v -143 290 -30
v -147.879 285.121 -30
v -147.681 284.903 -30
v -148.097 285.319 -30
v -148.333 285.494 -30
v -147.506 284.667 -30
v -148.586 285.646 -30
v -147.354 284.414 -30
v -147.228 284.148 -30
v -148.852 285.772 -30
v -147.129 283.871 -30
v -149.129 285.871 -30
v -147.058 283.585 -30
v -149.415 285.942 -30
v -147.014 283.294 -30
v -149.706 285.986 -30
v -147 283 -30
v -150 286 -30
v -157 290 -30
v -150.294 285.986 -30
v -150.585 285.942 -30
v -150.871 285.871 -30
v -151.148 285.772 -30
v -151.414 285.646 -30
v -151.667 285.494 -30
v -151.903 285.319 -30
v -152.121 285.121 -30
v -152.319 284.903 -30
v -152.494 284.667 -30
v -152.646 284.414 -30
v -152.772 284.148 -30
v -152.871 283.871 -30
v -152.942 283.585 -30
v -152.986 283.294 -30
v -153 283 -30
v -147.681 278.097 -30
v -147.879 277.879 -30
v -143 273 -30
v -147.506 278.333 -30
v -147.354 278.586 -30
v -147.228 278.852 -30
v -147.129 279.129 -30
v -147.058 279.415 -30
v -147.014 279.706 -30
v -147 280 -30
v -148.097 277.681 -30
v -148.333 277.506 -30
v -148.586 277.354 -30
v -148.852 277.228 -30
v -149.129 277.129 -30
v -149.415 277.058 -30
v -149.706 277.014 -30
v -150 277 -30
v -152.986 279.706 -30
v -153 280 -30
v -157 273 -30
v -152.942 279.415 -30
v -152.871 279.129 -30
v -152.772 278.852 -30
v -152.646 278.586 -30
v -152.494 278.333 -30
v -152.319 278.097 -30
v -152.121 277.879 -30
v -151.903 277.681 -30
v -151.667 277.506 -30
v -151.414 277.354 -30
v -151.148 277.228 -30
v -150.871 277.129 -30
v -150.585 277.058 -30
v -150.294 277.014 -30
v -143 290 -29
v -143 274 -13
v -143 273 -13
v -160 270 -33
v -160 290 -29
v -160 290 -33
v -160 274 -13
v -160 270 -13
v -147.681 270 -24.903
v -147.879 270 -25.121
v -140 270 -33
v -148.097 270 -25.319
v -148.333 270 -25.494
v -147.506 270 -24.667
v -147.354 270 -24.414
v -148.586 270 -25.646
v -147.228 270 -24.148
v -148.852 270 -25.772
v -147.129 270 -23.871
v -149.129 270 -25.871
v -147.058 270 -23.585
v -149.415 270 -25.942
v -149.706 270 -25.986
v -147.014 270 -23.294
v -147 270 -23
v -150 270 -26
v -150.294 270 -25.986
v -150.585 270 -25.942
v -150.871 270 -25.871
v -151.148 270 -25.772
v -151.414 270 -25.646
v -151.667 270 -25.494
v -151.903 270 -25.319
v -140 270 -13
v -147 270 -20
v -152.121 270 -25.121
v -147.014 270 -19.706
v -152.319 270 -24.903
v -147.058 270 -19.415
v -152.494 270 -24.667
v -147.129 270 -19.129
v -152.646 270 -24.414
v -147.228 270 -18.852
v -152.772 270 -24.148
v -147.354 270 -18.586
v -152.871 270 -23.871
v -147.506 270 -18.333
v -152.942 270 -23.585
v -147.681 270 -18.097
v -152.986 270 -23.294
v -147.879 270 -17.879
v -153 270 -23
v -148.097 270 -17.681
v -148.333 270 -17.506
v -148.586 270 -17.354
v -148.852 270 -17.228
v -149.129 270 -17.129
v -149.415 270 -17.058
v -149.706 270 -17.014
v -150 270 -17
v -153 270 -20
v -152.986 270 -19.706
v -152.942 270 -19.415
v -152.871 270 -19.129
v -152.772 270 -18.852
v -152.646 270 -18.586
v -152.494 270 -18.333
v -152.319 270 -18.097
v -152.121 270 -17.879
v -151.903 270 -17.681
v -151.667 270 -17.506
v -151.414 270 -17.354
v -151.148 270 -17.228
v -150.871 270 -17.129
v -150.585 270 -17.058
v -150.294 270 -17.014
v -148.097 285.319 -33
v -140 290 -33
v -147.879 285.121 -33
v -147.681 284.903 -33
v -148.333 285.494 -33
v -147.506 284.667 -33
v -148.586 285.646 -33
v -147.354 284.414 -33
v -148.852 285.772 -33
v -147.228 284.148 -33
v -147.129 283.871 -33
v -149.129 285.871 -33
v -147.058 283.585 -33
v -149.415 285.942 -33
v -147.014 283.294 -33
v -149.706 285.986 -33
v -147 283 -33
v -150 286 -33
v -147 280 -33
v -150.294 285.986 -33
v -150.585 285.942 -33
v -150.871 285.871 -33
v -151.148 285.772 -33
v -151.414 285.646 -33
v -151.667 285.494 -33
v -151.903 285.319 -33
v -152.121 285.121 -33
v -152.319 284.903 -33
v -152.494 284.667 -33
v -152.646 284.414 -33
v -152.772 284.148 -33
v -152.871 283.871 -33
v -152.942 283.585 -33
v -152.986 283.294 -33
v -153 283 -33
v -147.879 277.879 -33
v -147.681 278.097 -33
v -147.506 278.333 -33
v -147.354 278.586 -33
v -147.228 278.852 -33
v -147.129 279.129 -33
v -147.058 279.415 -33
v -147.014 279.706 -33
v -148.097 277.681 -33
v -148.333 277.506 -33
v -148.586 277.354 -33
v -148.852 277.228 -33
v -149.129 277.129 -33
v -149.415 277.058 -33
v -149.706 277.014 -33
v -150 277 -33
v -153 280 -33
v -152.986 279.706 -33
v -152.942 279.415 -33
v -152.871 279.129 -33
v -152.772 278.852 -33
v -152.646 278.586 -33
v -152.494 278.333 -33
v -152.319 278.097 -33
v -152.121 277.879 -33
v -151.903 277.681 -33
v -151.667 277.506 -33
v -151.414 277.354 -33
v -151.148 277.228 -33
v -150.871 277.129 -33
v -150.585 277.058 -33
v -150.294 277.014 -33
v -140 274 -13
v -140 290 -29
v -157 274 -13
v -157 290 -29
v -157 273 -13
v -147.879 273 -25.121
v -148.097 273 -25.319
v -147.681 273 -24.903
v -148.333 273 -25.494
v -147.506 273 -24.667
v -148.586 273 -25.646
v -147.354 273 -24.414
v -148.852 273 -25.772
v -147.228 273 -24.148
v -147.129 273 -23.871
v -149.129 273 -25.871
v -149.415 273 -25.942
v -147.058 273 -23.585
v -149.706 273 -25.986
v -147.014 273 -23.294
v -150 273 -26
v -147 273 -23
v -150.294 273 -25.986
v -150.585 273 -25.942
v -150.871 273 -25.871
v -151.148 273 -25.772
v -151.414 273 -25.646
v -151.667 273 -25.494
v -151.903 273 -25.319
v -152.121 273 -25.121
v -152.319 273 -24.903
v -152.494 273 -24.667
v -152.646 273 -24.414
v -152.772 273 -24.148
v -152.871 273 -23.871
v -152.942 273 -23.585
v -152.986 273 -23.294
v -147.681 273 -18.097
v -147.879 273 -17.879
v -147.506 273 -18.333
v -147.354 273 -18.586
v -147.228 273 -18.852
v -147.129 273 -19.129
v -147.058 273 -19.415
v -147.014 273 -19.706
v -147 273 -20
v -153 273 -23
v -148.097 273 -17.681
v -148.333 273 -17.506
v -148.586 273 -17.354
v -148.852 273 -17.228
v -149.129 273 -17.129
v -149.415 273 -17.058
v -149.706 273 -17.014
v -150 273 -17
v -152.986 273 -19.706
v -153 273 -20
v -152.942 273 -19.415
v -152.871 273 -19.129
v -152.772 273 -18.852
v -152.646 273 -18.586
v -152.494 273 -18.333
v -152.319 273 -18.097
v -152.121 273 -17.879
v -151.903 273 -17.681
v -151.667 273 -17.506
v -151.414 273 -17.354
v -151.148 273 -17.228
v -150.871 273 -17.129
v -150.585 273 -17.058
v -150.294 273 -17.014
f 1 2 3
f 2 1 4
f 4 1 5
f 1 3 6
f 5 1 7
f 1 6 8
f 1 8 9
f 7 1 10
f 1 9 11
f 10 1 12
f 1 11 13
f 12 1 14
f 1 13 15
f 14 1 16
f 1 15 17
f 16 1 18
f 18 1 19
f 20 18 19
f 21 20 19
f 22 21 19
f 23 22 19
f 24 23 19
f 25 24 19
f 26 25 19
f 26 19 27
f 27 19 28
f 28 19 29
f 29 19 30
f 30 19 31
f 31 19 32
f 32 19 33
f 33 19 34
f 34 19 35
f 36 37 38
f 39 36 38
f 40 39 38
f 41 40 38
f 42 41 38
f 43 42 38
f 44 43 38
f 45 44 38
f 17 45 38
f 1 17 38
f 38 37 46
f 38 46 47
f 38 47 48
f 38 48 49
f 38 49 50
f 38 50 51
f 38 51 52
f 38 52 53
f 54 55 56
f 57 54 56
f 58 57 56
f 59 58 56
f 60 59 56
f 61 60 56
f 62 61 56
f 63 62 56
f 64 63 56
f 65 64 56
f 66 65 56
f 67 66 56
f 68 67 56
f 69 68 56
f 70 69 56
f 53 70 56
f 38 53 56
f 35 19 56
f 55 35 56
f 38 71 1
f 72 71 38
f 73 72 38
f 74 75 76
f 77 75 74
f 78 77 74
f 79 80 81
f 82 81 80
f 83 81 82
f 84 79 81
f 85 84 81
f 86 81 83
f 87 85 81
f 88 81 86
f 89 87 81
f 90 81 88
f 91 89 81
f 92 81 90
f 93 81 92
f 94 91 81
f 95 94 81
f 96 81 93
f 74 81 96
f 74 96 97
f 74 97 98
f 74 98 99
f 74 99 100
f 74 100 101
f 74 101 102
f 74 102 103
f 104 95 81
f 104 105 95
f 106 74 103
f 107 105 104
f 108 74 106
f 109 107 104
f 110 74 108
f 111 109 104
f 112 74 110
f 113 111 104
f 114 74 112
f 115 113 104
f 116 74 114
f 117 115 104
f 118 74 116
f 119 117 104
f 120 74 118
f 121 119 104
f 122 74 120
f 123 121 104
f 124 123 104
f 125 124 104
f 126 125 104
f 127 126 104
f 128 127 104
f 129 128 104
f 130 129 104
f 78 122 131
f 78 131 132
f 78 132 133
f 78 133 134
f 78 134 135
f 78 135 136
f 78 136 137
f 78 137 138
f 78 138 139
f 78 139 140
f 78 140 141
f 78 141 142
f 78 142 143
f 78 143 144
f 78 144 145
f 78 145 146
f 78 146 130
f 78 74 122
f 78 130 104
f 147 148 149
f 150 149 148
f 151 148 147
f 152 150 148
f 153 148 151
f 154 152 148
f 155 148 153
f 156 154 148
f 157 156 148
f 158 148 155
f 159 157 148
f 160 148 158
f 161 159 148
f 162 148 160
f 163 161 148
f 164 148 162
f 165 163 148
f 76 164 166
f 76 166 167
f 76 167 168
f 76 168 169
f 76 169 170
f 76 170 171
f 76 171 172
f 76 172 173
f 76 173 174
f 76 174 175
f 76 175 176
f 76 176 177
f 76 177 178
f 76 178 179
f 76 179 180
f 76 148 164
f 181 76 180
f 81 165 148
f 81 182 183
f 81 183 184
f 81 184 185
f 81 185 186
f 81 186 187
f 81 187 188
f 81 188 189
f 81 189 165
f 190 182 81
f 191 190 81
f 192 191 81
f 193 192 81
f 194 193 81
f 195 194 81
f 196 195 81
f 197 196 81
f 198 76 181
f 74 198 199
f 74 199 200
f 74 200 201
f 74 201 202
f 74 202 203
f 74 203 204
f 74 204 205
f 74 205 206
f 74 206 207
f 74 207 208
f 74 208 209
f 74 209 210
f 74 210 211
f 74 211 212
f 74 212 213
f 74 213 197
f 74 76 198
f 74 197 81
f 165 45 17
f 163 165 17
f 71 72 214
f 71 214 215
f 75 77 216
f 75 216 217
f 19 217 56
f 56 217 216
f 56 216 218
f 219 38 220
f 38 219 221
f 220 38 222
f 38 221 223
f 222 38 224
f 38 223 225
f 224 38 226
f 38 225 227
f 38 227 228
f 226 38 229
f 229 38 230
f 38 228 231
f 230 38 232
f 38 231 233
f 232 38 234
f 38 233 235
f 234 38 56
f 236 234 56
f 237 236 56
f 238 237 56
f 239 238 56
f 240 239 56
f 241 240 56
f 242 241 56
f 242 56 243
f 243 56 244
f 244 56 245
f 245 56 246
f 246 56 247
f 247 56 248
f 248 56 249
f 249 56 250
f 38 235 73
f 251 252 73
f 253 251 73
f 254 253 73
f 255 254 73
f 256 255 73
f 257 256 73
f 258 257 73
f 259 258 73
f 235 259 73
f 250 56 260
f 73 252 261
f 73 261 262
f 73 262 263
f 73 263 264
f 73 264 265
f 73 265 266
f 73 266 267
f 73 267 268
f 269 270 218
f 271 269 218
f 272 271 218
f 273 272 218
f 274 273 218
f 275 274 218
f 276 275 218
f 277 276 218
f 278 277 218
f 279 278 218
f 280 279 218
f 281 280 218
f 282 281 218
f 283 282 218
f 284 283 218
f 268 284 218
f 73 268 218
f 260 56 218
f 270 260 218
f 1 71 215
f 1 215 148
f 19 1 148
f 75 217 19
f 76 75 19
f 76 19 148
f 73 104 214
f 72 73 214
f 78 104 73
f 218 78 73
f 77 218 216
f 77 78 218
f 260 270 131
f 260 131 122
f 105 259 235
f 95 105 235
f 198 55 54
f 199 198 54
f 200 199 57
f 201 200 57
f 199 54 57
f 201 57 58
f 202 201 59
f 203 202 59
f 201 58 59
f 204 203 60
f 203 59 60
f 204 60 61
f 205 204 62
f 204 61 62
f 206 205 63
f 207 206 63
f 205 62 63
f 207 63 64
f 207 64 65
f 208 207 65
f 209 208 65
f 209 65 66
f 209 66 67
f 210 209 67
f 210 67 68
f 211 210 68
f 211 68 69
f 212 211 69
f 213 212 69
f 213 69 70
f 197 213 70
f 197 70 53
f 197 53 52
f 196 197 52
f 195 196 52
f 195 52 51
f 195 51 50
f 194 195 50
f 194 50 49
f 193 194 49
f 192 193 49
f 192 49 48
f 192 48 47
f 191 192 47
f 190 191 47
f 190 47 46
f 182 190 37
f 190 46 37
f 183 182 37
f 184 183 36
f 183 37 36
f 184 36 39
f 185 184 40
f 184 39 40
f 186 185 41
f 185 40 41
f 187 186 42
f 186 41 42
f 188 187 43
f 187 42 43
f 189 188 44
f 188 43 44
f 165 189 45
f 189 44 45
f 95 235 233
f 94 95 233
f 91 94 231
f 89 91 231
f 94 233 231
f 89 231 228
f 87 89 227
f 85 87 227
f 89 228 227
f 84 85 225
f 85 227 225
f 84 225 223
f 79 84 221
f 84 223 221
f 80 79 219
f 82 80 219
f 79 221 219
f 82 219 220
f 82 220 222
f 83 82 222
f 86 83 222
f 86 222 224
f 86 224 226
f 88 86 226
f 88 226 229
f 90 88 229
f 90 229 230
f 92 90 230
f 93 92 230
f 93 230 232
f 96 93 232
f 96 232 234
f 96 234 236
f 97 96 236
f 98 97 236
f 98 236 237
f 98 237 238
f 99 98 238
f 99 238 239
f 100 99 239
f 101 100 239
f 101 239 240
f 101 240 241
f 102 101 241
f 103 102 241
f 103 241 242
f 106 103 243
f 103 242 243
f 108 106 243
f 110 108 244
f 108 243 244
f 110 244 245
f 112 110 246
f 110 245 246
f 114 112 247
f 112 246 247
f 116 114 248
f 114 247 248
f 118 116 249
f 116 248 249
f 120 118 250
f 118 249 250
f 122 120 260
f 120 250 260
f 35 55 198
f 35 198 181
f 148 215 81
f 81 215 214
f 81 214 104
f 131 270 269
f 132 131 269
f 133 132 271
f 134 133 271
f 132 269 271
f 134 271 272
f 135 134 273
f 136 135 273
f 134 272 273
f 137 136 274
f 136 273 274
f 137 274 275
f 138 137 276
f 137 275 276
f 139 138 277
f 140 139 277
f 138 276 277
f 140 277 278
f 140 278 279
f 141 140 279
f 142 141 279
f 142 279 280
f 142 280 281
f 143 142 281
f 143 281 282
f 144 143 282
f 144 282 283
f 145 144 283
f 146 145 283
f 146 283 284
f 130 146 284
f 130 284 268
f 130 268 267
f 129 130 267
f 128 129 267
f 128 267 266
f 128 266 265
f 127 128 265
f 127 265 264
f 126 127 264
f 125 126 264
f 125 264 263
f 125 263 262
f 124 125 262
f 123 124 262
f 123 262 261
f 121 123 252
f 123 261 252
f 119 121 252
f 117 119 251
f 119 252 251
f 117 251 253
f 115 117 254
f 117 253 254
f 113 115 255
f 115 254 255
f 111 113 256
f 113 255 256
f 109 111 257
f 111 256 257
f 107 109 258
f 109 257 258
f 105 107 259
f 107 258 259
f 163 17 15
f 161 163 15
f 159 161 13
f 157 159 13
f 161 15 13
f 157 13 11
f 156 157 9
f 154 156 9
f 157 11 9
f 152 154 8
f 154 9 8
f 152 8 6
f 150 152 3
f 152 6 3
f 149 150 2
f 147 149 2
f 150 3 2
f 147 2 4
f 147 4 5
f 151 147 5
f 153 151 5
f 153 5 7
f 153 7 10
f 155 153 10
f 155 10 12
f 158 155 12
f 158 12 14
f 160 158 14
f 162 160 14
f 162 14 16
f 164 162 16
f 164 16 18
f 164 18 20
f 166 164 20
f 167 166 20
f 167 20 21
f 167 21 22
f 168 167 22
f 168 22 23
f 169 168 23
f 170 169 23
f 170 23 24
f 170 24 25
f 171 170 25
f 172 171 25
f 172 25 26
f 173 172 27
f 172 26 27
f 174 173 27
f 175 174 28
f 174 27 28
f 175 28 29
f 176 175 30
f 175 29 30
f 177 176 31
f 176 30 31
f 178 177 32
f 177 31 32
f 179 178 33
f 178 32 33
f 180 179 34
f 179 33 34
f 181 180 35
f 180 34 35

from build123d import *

# Parameters (mm, degrees)
PAD102_DEPTH            = 20
THICKNESS001_T          = -3
POCKET077_DEPTH         = 5
POCKET078_DEPTH         = 5
BODY127_PLACEMENT_ANGLE = 90


with BuildPart() as part:
    # Sketch211 (on XZ_Plane1033 of Origin1405) → Pad102 (new body)
    with BuildSketch(Plane.XZ):
        Polygon((0, 0), (0, 20), (4, 20), (20, 4), (20, 0), align=None)
    extrude(amount=PAD102_DEPTH)

    # Thickness001
    thickness001_openings = [part.faces().sort_by_distance(p)[0] for p in [
        (2, -10, 20),
        (12, -10, 12),
        (20, -10, 2),
    ]]
    offset(amount=THICKNESS001_T, openings=thickness001_openings)

    # Sketch212 (on Face11 of Thickness001) → Pocket077 (cut)
    with BuildSketch(Plane.YZ.offset(3)):
        with BuildLine():
            ThreePointArc((-7, 13), (-10, 16), (-13, 13))
            Line((-13, 13), (-13, 10))
            ThreePointArc((-13, 10), (-10, 7), (-7, 10))
            Line((-7, 13), (-7, 10))
        make_face()
    extrude(amount=-POCKET077_DEPTH, mode=Mode.SUBTRACT)

    # Sketch213 (on Face16 of Pocket077) → Pocket078 (cut)
    with BuildSketch(Plane.XY.offset(3)):
        with BuildLine():
            ThreePointArc((10, -7), (7, -10), (10, -13))
            Line((10, -13), (13, -13))
            ThreePointArc((13, -13), (16, -10), (13, -7))
            Line((10, -7), (13, -7))
        make_face()
    extrude(amount=-POCKET078_DEPTH, mode=Mode.SUBTRACT)


with BuildPart() as part_1:
    # Body127 placement: moved
    add(part.part.moved(Location((-160, 270, -33))).rotate(Axis((-160, 270, -33), (0, 0, 1)), BODY127_PLACEMENT_ANGLE))


solid = part_1.part
